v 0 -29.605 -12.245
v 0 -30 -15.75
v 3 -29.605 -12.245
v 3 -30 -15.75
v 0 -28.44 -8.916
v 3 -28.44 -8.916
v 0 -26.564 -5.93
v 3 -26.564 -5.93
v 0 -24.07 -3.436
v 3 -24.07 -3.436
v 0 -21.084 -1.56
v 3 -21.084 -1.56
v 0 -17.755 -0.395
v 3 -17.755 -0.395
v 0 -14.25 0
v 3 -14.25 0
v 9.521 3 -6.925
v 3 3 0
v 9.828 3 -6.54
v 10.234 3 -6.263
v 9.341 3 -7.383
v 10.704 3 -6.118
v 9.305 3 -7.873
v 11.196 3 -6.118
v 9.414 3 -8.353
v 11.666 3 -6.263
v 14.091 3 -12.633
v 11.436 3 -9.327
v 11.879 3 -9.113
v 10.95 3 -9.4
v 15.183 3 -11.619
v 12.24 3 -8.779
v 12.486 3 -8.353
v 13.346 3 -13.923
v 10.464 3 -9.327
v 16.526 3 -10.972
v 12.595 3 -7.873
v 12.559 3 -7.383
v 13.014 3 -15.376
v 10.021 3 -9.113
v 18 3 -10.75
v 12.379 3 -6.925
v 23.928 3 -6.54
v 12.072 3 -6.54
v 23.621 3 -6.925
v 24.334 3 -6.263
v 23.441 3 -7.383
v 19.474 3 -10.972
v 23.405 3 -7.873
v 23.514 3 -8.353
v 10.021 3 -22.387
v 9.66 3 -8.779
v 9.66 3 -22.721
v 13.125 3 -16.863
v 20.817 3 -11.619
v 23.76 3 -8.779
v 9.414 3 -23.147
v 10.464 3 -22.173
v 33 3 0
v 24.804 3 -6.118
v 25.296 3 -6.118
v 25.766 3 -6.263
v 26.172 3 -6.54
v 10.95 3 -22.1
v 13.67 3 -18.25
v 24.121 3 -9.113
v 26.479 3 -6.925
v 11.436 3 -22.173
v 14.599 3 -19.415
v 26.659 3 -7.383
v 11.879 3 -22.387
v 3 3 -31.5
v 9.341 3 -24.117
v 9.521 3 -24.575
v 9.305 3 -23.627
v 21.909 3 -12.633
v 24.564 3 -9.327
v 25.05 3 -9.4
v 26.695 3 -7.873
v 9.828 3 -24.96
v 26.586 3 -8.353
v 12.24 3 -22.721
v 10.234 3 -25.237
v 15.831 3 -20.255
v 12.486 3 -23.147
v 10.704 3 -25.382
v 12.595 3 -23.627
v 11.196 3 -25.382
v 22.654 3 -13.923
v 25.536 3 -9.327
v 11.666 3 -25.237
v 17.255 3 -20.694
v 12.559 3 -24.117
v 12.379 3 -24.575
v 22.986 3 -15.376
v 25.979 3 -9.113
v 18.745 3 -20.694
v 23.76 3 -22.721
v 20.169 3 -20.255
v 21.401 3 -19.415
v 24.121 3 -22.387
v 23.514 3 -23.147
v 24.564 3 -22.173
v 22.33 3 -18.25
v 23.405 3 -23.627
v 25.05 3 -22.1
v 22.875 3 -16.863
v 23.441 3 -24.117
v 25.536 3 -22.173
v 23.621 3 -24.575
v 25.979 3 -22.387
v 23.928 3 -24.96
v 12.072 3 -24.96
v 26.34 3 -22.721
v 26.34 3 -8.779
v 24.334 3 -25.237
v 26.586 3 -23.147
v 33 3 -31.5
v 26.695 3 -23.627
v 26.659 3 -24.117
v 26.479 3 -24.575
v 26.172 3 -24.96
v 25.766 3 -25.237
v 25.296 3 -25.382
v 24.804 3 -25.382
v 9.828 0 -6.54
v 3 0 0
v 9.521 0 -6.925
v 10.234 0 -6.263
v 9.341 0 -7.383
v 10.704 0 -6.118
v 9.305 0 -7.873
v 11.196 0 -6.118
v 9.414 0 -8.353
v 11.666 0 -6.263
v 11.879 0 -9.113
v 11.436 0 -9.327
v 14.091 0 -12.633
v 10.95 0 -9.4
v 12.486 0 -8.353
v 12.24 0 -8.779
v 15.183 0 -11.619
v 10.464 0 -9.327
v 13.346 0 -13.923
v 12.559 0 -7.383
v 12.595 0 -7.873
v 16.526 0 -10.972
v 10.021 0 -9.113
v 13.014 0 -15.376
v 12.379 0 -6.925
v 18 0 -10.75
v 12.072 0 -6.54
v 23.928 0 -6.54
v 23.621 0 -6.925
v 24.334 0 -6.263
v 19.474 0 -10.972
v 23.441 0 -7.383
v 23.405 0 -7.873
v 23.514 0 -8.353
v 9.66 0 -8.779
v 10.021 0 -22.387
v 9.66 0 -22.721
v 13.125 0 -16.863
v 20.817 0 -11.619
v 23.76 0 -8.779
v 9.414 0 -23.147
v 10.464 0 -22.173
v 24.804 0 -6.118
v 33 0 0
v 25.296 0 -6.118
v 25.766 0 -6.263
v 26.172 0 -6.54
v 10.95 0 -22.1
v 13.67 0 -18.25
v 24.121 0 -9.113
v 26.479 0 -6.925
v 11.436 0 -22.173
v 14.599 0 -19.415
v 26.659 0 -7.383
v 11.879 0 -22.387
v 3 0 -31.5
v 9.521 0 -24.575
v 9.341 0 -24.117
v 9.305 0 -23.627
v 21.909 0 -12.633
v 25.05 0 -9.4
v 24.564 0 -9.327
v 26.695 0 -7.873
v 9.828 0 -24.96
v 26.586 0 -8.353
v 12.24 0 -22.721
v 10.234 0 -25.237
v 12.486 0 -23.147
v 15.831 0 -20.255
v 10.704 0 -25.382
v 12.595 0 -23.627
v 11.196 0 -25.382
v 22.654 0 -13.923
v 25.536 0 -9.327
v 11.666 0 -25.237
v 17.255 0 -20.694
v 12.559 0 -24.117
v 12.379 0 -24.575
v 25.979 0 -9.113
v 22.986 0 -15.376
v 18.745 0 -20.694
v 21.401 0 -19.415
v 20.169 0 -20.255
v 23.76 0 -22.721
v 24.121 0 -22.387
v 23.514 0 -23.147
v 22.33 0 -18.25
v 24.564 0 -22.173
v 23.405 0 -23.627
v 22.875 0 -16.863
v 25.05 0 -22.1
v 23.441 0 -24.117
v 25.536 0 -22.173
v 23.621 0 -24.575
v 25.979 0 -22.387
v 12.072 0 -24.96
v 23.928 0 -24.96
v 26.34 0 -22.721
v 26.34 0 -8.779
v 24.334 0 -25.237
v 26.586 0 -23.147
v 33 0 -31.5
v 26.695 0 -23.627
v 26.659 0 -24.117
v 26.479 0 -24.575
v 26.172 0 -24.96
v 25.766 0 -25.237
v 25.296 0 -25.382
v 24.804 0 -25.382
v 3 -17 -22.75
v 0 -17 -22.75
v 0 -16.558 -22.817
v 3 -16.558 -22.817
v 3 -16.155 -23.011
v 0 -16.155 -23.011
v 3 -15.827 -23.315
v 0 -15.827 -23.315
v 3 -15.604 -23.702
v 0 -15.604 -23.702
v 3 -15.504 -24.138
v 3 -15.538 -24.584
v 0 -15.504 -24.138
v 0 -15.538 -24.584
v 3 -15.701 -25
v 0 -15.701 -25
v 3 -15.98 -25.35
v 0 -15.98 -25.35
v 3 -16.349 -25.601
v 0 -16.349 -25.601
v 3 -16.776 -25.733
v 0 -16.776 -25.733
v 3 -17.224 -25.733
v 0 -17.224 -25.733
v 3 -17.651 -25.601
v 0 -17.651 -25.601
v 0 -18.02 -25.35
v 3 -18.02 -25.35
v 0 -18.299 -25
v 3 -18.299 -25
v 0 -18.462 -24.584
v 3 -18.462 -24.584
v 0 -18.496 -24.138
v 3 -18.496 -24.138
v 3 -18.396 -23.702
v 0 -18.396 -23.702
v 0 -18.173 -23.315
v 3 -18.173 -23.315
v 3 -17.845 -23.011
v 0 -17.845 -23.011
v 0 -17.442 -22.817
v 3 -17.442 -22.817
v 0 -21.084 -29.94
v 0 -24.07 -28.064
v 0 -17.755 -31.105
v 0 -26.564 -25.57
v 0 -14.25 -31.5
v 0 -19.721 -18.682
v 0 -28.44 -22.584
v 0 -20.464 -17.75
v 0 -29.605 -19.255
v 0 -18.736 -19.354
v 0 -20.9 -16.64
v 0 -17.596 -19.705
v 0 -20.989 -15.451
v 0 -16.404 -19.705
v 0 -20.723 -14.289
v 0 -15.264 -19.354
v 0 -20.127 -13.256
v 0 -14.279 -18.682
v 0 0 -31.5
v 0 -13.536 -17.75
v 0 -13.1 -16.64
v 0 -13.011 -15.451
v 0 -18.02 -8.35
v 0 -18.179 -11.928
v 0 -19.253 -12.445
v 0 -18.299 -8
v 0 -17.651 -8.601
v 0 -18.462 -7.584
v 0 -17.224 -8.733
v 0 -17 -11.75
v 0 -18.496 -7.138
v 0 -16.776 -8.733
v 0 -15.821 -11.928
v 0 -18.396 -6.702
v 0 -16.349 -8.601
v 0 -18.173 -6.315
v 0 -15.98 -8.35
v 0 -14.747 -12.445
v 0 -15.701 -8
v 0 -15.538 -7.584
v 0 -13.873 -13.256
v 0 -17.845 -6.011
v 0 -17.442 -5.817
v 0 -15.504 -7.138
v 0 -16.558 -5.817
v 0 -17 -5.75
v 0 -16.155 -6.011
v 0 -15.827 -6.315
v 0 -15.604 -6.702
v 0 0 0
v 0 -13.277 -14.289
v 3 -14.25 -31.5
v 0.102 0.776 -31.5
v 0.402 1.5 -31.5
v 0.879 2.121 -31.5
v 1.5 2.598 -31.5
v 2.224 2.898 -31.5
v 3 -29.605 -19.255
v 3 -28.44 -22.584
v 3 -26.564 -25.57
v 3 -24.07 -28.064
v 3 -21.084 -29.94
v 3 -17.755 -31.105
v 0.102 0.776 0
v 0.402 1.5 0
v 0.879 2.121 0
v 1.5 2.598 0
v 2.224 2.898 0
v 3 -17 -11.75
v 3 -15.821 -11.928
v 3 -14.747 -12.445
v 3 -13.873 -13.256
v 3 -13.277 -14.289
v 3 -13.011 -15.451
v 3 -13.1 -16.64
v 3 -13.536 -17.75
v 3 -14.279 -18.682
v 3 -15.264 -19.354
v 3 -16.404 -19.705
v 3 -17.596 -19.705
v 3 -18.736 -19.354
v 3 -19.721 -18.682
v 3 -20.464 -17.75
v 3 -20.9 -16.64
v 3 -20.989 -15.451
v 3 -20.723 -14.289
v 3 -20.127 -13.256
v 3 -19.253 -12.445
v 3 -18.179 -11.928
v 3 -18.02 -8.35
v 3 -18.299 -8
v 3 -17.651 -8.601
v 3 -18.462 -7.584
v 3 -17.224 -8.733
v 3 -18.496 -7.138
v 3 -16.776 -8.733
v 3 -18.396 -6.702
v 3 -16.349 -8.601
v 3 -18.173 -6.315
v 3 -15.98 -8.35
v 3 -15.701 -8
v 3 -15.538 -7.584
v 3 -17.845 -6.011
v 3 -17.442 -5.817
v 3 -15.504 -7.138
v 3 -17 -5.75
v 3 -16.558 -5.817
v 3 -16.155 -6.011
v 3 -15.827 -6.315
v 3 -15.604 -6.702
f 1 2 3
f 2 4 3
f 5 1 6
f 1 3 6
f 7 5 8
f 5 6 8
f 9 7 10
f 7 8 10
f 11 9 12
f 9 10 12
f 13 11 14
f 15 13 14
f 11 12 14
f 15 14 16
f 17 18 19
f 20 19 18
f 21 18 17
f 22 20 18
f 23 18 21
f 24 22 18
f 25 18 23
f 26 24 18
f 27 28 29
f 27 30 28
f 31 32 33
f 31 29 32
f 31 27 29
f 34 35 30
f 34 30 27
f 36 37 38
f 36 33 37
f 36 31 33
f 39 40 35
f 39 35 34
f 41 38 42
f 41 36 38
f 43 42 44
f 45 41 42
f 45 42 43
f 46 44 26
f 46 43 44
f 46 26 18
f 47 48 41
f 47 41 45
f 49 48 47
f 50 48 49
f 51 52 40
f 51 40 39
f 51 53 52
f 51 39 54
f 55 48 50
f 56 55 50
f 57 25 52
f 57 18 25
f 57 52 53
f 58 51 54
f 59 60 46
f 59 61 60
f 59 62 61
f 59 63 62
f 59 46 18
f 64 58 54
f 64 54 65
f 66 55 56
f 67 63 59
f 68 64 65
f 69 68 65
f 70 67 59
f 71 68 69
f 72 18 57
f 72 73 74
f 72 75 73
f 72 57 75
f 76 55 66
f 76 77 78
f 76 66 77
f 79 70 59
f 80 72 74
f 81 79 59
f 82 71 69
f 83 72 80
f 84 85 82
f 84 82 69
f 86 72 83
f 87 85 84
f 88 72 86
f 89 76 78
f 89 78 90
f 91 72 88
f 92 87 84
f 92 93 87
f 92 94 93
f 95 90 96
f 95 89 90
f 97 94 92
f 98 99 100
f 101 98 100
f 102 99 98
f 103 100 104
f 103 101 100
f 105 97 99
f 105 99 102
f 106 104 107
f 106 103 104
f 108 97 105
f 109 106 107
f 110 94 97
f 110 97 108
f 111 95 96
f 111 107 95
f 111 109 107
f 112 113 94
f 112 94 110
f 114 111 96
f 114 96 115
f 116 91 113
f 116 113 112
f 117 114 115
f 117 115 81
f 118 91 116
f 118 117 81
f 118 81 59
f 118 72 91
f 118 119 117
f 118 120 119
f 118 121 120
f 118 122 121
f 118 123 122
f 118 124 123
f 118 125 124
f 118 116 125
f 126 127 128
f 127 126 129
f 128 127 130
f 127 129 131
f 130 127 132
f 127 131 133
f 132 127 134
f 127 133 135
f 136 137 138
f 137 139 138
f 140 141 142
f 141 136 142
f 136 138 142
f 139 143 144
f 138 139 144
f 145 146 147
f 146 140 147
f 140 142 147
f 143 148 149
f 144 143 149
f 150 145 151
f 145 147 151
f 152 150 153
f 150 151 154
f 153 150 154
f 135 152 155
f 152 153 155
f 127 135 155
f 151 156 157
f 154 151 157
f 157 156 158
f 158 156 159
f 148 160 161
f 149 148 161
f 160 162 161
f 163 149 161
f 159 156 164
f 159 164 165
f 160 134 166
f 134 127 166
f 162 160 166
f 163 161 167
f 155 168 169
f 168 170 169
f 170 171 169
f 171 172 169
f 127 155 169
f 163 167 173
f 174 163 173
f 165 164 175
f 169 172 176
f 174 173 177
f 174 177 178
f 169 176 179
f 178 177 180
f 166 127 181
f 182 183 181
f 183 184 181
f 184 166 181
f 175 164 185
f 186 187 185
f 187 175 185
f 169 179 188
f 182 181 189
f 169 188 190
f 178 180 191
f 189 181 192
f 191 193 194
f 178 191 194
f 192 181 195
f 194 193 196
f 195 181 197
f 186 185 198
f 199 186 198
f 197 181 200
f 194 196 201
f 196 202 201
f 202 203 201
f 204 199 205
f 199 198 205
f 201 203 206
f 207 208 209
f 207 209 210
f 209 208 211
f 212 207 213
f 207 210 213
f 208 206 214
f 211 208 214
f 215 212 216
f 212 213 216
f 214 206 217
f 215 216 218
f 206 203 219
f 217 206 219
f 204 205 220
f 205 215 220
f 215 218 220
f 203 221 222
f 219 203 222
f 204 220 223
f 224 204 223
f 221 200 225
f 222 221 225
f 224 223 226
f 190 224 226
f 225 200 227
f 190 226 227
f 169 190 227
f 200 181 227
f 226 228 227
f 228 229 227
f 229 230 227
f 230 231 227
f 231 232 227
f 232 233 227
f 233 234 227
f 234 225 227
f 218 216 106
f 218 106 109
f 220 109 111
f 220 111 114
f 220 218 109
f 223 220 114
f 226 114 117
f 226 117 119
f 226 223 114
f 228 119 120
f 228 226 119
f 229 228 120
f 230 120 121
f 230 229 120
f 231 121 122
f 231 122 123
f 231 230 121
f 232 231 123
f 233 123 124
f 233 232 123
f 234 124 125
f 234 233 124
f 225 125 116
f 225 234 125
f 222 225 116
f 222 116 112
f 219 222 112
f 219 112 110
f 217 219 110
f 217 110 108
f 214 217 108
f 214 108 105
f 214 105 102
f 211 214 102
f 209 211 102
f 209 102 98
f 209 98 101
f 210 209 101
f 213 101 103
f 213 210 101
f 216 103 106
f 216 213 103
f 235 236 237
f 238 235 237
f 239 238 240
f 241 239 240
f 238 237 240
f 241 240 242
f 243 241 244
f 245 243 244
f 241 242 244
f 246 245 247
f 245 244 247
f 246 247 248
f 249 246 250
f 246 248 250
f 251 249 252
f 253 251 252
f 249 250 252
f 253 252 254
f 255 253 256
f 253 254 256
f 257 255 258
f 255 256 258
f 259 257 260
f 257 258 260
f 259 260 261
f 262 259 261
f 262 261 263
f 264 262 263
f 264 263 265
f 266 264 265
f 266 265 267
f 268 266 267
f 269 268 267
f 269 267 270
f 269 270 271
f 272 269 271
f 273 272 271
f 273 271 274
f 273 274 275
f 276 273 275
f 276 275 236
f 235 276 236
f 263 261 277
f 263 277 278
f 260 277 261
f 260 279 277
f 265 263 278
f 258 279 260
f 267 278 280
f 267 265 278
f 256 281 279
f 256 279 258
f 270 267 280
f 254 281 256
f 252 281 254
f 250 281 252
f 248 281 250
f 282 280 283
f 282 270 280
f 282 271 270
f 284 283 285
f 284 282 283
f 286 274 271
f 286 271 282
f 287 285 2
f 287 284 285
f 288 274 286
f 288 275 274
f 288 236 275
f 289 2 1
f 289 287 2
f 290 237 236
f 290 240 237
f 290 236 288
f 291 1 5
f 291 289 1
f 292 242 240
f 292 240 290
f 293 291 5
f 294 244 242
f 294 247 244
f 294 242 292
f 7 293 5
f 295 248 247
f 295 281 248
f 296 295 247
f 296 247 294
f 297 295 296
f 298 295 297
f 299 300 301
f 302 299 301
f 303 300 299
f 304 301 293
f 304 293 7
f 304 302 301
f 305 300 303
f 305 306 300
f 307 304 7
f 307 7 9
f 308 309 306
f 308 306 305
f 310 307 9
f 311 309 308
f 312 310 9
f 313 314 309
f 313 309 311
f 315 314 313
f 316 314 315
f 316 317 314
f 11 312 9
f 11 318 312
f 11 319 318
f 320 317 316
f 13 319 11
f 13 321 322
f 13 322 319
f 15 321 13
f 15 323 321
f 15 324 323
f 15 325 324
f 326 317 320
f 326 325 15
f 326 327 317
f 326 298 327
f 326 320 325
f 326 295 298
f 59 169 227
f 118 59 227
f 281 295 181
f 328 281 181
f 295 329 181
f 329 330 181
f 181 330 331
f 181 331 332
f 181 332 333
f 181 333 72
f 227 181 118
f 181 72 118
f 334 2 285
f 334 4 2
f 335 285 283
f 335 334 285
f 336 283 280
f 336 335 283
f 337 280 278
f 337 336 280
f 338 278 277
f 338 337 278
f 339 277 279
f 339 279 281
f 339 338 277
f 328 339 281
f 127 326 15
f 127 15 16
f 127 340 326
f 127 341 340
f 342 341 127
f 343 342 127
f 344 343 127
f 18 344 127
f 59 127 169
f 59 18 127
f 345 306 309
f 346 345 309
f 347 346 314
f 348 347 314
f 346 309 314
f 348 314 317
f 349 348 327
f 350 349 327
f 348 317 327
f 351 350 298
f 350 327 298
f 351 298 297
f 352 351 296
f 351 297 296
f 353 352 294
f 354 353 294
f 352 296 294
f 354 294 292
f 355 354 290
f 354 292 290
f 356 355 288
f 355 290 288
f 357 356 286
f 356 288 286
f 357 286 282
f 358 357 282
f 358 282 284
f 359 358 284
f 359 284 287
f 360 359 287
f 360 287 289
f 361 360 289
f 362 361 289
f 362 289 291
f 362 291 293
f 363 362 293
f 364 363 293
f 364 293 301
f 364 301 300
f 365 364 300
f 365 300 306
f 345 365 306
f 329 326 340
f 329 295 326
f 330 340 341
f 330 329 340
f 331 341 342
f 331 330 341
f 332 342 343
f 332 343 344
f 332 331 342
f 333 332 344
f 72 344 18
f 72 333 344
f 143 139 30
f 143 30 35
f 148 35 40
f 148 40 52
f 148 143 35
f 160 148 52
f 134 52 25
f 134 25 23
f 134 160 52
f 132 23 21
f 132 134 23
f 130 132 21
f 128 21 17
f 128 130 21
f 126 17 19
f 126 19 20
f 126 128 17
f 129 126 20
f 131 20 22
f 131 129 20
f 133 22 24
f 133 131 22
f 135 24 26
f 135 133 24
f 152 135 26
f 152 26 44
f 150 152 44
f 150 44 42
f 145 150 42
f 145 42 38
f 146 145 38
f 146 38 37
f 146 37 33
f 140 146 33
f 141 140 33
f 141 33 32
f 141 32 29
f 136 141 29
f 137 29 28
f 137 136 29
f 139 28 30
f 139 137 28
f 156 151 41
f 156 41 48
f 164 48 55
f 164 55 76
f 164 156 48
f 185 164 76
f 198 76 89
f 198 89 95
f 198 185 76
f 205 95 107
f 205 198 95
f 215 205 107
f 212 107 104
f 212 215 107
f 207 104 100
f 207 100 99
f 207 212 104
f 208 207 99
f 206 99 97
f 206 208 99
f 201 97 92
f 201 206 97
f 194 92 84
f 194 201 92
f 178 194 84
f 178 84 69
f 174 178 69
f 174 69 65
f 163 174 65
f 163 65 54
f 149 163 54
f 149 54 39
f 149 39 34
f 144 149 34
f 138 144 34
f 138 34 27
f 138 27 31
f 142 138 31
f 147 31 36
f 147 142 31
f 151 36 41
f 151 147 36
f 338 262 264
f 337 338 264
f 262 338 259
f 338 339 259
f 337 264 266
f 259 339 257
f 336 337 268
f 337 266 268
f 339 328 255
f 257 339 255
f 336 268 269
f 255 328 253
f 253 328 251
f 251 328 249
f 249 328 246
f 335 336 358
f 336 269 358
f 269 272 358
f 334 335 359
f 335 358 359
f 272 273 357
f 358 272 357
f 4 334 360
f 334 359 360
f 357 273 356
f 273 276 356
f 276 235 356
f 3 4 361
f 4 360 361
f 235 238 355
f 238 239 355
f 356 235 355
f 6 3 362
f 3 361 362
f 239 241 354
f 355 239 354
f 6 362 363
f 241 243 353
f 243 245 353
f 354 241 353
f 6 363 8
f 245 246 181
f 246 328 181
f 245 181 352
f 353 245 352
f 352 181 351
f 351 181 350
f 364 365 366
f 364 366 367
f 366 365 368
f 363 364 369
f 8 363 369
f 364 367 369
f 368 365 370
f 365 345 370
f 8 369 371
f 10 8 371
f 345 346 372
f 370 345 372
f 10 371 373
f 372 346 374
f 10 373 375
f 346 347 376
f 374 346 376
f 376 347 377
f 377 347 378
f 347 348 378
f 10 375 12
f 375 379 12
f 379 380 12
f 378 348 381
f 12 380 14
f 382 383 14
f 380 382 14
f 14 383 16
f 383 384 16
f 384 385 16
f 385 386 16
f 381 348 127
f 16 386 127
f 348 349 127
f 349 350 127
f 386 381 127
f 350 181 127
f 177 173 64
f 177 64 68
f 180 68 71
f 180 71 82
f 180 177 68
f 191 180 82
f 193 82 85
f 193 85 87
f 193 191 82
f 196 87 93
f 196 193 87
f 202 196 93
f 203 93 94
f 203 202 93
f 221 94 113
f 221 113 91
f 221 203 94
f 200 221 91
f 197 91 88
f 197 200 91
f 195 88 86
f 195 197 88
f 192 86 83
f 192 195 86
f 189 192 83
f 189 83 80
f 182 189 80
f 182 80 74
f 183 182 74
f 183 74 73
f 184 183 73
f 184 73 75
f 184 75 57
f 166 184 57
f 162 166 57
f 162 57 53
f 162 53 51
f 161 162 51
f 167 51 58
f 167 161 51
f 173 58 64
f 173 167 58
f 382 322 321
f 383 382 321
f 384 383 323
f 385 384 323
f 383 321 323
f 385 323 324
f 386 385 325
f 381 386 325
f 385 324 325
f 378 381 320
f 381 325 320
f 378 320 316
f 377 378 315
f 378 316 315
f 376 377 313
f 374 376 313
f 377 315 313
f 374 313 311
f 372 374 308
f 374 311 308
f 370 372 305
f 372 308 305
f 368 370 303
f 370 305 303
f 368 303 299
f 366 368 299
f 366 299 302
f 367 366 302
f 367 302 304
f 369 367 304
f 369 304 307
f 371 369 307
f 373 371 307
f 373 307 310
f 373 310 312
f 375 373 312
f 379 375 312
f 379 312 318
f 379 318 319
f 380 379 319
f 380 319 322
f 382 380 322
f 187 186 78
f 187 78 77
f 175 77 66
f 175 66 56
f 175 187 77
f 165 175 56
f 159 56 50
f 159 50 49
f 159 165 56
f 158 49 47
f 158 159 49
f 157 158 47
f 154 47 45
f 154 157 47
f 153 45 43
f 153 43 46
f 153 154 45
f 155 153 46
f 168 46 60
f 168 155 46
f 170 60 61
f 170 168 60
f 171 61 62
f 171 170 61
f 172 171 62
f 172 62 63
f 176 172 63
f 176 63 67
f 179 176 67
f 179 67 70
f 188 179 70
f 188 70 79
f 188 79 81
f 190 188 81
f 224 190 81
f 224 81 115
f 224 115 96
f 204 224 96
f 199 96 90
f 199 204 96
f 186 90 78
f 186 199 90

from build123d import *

# Parameters (mm, degrees)
SKETCH1_W           = 33
SKETCH1_H           = 31.5
SKETCH1_R           = 5
SKETCH1_R_2         = 1.65
BOSS_EXTRUDE1_DEPTH = 3
SKETCH2_W           = 3
SKETCH2_H           = 31.5
BOSS_EXTRUDE2_DEPTH = 30
SKETCH3_R           = 1.5
SKETCH3_R_2         = 4
CUT_EXTRUDE1_DEPTH  = 30
FILLET3_R           = 15.75
FILLET4_R           = 3


with BuildPart() as part:
    # Sketch1 → Boss-Extrude1 (new body)
    with BuildSketch(Plane(origin=(0, 0, 0), x_dir=(1, 0, 0), z_dir=(0, 1, 0))):
        with Locations((16.5, 15.75)):
            Rectangle(SKETCH1_W, SKETCH1_H)
        with Locations(Location((18, 15.75, 0), (0, 0, 270))):
            Circle(SKETCH1_R, mode=Mode.SUBTRACT)
        with Locations(Location((25.05, 23.75, 0), (0, 0, 270))):
            Circle(SKETCH1_R_2, mode=Mode.SUBTRACT)
        with Locations(Location((10.95, 23.75, 0), (0, 0, 270))):
            Circle(SKETCH1_R_2, mode=Mode.SUBTRACT)
        with Locations(Location((25.05, 7.75, 0), (0, 0, 90))):
            Circle(SKETCH1_R_2, mode=Mode.SUBTRACT)
        with Locations(Location((10.95, 7.75, 0), (0, 0, 90))):
            Circle(SKETCH1_R_2, mode=Mode.SUBTRACT)
    extrude(amount=BOSS_EXTRUDE1_DEPTH)

    # Sketch2 → Boss-Extrude2 (add)
    with BuildSketch(Plane.XZ):
        with Locations((1.5, -15.75)):
            Rectangle(SKETCH2_W, SKETCH2_H)
    extrude(amount=BOSS_EXTRUDE2_DEPTH)

    # Sketch3 → Cut-Extrude1 (cut)
    with BuildSketch(Plane.ZY):
        with Locations((-24.25, -17)):
            Circle(SKETCH3_R)
        with Locations((-7.25, -17)):
            Circle(SKETCH3_R)
        with Locations((-15.75, -17)):
            Circle(SKETCH3_R_2)
    extrude(amount=-CUT_EXTRUDE1_DEPTH, mode=Mode.SUBTRACT)

    # Fillet3
    fillet3_edges = [part.edges().sort_by_distance(p)[0] for p in [
        (1.5, -30, 0),
        (1.5, -30, -31.5),
    ]]
    fillet(fillet3_edges, radius=FILLET3_R - 0.0001)  # a hair under: the kernel refuses the full size

    # Fillet4
    fillet4_edges = [part.edges().sort_by_distance(p)[0] for p in [
        (0, 3, -15.75),
    ]]
    fillet(fillet4_edges, radius=FILLET4_R)


solid = part.part
